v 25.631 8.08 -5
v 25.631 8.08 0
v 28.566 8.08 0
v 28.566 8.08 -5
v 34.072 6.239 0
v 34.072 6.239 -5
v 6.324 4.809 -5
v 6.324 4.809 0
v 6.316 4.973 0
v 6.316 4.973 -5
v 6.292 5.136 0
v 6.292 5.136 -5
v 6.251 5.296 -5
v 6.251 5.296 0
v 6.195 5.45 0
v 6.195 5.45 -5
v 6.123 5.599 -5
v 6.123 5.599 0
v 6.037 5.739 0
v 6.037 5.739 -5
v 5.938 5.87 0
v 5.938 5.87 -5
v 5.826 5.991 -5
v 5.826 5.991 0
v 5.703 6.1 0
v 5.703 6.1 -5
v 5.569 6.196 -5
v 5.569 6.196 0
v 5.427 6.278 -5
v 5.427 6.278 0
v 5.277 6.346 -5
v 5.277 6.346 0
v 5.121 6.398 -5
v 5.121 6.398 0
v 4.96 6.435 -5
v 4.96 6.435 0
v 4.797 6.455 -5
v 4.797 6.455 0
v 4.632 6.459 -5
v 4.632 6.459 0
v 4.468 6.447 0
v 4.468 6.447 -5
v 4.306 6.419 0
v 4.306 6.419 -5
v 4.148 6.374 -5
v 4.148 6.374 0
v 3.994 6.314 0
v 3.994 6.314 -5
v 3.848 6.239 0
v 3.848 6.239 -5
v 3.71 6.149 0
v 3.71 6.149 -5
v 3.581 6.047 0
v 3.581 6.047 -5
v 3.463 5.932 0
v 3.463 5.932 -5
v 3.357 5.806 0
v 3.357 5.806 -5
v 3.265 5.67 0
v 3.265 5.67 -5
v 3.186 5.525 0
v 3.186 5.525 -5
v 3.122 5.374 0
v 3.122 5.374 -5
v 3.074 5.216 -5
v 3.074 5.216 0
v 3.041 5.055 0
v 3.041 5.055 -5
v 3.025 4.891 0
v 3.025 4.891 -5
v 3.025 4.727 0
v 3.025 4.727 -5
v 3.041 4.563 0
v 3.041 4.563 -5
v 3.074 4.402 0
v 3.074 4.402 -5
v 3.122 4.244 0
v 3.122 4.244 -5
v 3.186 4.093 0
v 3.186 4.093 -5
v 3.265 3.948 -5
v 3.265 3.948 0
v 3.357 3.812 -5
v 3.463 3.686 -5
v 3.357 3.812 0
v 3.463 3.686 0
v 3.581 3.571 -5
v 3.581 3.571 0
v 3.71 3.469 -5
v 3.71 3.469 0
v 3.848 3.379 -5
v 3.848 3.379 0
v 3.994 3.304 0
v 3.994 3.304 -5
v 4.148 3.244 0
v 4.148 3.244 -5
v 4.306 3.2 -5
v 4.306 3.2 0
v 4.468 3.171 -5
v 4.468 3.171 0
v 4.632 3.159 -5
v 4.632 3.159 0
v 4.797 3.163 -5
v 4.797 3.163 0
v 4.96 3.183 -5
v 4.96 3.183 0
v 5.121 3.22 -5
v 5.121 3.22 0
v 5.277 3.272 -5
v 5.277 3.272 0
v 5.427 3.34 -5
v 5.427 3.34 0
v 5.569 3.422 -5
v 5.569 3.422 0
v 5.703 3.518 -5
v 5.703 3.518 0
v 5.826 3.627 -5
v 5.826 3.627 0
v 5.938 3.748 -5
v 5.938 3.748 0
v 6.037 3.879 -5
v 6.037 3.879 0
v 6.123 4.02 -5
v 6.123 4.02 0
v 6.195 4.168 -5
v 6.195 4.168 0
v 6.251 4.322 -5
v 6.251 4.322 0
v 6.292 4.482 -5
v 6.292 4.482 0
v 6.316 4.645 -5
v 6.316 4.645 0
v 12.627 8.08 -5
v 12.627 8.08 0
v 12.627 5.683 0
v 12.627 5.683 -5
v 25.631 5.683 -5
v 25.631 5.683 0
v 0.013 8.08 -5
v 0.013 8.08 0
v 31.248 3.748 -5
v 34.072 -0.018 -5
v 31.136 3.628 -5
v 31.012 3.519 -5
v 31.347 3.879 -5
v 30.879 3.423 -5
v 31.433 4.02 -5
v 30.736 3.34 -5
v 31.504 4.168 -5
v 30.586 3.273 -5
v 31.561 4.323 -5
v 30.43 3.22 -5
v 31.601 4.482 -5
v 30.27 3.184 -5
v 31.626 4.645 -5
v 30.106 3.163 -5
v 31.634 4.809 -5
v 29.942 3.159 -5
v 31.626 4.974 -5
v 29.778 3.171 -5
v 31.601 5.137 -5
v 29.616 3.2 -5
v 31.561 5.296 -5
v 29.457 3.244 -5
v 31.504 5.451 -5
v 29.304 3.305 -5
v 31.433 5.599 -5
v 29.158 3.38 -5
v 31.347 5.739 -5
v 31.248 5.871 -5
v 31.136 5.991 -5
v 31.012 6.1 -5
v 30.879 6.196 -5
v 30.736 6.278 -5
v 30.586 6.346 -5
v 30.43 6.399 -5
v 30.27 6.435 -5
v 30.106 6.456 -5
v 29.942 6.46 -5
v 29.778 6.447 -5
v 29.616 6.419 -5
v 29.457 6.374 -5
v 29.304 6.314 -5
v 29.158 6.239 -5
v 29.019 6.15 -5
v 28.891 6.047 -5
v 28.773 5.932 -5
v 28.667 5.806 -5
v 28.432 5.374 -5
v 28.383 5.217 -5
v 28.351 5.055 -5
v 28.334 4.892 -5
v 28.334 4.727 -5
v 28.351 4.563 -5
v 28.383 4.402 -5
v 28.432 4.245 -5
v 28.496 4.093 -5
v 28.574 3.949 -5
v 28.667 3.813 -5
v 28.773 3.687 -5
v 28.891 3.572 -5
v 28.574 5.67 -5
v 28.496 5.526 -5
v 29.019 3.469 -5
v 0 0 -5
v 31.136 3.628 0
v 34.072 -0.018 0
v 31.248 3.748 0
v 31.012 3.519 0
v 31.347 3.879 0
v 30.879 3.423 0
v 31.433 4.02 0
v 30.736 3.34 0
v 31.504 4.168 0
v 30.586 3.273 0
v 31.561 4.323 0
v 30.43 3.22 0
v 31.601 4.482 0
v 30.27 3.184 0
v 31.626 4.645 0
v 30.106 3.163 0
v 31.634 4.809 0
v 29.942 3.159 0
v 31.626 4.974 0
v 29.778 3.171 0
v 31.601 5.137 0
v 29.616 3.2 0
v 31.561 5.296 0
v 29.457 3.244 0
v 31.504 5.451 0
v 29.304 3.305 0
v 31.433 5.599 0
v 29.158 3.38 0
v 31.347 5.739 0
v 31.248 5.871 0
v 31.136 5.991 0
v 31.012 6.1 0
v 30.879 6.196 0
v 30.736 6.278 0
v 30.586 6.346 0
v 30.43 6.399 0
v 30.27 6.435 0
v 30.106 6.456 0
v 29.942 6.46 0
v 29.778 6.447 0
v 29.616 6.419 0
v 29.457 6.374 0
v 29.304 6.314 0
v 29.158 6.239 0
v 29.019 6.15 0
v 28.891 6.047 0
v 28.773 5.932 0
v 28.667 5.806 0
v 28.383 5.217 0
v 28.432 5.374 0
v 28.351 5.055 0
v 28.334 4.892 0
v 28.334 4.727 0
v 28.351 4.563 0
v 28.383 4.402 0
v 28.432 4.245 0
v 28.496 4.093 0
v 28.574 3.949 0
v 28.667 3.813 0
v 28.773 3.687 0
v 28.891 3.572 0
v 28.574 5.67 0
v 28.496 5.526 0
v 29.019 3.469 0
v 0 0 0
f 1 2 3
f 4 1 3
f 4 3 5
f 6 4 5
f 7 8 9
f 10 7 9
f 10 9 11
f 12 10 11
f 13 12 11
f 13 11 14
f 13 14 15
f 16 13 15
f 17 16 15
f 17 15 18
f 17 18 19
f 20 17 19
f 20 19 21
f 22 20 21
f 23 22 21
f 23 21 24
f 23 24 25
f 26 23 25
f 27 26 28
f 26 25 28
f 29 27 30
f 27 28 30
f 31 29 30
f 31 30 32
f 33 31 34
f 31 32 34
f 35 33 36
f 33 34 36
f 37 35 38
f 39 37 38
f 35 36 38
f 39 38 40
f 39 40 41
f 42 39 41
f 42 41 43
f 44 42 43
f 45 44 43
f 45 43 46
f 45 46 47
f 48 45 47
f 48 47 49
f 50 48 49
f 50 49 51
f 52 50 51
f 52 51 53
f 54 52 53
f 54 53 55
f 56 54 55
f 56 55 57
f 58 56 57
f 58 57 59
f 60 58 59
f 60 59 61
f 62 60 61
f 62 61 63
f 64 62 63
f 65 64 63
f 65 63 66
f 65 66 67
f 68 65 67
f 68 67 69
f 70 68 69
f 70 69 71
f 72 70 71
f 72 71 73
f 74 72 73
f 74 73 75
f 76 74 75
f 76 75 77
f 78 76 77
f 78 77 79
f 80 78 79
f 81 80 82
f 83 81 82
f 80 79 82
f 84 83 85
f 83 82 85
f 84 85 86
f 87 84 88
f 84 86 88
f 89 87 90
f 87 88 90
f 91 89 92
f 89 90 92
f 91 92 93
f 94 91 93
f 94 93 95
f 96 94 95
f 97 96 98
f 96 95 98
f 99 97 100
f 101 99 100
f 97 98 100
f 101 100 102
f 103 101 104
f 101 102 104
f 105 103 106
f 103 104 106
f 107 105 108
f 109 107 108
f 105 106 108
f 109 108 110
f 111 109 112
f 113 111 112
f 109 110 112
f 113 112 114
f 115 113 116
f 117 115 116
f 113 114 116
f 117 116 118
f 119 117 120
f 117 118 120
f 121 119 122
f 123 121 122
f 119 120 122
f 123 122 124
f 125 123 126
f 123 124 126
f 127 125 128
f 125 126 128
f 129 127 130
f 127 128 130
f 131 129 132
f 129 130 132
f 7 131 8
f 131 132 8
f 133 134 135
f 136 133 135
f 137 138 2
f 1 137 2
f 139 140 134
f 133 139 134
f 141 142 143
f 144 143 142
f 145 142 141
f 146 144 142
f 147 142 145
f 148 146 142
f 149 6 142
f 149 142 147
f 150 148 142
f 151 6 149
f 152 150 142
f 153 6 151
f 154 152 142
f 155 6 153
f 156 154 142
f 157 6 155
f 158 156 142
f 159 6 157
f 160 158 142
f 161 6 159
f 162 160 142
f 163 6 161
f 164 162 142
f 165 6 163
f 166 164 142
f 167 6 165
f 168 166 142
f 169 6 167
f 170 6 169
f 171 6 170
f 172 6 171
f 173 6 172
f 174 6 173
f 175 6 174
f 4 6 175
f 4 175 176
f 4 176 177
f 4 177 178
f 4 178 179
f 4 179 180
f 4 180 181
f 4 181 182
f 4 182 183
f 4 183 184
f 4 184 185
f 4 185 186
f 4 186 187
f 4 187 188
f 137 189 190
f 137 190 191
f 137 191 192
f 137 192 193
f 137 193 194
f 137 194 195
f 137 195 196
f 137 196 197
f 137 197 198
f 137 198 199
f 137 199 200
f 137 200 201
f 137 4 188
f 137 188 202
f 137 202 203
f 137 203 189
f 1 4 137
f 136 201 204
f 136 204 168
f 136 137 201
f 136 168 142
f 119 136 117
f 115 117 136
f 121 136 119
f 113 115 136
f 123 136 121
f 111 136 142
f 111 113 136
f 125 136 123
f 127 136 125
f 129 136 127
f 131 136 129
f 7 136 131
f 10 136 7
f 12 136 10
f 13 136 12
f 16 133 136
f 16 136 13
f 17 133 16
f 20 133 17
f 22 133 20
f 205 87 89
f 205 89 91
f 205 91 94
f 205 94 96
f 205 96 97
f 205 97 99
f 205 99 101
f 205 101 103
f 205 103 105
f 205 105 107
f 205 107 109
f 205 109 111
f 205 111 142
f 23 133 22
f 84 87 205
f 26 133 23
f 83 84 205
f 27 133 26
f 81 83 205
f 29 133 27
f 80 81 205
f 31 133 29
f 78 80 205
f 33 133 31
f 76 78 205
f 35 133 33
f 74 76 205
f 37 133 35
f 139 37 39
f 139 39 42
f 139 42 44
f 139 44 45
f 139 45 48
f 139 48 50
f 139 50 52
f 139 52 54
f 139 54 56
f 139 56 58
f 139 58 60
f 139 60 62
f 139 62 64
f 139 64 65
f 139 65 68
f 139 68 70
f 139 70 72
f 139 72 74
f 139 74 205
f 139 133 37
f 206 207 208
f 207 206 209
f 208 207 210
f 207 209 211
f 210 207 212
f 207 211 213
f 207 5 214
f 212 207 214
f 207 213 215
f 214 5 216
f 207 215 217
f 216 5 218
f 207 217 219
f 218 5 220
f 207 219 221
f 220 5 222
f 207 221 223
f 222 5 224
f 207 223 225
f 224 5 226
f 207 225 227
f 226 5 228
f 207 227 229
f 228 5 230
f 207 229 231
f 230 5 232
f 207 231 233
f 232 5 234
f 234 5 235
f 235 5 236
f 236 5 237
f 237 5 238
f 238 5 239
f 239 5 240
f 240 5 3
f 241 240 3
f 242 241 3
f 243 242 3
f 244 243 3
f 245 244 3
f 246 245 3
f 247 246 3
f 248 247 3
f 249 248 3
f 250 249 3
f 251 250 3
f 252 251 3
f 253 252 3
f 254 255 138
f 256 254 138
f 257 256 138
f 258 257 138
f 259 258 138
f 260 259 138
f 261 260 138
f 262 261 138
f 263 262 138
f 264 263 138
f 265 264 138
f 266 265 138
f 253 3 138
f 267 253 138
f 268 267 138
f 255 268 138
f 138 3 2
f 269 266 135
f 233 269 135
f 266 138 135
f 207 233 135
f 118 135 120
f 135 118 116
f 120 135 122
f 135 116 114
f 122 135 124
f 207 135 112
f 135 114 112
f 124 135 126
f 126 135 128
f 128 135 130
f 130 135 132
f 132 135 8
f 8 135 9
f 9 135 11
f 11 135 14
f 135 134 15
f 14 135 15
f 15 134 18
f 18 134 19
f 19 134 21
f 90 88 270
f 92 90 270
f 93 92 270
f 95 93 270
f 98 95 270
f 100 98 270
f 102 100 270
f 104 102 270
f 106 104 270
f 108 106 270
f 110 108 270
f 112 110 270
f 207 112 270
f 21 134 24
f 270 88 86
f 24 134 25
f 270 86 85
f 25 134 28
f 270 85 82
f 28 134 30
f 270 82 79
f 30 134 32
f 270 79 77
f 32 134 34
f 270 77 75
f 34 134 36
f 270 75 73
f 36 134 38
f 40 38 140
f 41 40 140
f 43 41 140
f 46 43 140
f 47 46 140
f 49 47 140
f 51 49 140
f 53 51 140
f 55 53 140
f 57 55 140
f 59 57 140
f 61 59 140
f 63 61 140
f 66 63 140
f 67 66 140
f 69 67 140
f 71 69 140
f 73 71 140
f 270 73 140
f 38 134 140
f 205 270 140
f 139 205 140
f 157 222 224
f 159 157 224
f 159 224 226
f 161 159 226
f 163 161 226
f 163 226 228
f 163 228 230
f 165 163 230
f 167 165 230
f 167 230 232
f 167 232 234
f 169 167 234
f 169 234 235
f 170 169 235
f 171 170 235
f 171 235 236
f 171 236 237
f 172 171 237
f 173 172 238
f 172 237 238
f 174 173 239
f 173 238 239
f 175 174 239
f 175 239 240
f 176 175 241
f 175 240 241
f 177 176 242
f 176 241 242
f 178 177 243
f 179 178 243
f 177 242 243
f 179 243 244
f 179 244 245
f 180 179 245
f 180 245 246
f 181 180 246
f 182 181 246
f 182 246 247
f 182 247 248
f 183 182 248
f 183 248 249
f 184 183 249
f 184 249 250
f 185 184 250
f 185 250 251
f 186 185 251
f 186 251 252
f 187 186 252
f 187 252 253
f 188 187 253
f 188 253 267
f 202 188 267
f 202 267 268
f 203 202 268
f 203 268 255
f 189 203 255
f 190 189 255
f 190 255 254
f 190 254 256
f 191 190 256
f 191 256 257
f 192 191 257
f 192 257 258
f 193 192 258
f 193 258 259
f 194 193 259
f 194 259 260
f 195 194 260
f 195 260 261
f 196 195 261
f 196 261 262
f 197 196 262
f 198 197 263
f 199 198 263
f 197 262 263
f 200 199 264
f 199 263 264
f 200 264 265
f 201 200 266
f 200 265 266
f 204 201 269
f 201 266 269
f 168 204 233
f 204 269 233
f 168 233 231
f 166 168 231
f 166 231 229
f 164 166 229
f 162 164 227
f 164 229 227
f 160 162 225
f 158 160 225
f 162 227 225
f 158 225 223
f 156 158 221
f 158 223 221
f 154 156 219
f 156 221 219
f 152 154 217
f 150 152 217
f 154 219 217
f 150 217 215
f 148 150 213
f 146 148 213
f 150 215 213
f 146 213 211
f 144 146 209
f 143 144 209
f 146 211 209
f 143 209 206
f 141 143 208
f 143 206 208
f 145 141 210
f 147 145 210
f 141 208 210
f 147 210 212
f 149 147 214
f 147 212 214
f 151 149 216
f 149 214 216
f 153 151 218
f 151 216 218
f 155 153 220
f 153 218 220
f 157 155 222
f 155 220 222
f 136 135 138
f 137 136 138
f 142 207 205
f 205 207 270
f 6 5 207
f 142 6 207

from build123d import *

# Parameters (mm, degrees)
BOSS_EXTRUDE1_DEPTH = 5
HOLES_R             = 1.650876527
HOLES_R_2           = 1.650891558
CUT_EXTRUDE1_DEPTH  = 36.37184843


with BuildPart() as part:
    # outline → Boss-Extrude1 (new body)
    with BuildSketch(Plane.XY):
        Polygon((0.012852413, 8.079831137), (12.627409632, 8.079831137), (12.627409632, 5.682741476), (25.630939629, 5.682741476), (25.630939629, 8.079831137), (28.565803795, 8.079831137), (34.071747683, 6.239460073), (34.071747683, -0.017512268), (0, 0), align=None)
    extrude(amount=-BOSS_EXTRUDE1_DEPTH)

    # holes → Cut-Extrude1 (cut, through all)
    with BuildSketch(Plane.XY):
        with Locations((4.673381995, 4.809052053)):
            Circle(HOLES_R)
        with Locations((29.983123795, 4.809407398)):
            Circle(HOLES_R_2)
    extrude(amount=-CUT_EXTRUDE1_DEPTH, mode=Mode.SUBTRACT)


solid = part.part
